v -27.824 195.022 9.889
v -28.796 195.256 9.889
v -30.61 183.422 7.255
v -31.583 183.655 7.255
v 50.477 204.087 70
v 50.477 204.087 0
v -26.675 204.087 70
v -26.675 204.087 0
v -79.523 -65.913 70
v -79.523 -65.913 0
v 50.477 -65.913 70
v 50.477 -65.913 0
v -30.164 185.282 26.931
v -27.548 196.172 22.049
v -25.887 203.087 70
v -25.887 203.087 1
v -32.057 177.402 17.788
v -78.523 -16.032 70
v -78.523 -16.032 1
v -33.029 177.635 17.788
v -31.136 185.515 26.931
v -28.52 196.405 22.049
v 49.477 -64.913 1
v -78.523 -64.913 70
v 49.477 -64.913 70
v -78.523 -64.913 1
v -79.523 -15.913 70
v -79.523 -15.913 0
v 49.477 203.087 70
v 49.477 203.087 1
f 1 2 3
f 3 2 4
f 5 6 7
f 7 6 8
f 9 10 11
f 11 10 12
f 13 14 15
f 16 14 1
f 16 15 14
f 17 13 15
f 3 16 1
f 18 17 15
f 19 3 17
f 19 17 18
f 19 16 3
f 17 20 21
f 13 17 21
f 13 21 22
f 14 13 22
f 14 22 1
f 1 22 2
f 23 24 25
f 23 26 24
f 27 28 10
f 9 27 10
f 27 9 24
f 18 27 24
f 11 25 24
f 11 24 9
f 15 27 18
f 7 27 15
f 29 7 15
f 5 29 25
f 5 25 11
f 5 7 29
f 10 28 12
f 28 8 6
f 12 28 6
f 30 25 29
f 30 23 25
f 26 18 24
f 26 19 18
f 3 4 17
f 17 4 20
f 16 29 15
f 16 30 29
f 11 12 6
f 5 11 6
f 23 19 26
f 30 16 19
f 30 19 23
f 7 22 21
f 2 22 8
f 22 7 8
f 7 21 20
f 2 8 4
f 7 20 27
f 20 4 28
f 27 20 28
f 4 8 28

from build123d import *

# Parameters (mm, degrees)
F1_DEPTH = 70
F2_T     = -1
F4_DEPTH = 4


with BuildPart() as f1:
    # F0 (on Top) → F1 (new body)
    with BuildSketch(Plane.XY):
        Polygon((50.477442, 204.086703), (-26.674857, 204.086703), (-79.522558, -15.913297), (-79.522558, -65.913297), (50.477442, -65.913297), align=None)
    extrude(amount=F1_DEPTH)

    # F2
    f2_openings = [f1.faces().sort_by_distance(p)[0] for p in [
        (-5.117094, 56.846235, 70),
    ]]
    offset(amount=F2_T, openings=f2_openings)

    # F3 (on face) → F4 (cut)
    with BuildSketch(Plane(origin=(-71.57003, 17.192325, 0), x_dir=(-0.233572, -0.972339, 0), z_dir=(-0.972339, 0.233572, 0))):
        Polygon((-165.007069, 17.787976), (-173.111157, 26.931221), (-184.3112, 22.049193), (-183.12912, 9.888689), (-171.19851, 7.255112), align=None)
    extrude(amount=-F4_DEPTH, mode=Mode.SUBTRACT)


solid = f1.part
